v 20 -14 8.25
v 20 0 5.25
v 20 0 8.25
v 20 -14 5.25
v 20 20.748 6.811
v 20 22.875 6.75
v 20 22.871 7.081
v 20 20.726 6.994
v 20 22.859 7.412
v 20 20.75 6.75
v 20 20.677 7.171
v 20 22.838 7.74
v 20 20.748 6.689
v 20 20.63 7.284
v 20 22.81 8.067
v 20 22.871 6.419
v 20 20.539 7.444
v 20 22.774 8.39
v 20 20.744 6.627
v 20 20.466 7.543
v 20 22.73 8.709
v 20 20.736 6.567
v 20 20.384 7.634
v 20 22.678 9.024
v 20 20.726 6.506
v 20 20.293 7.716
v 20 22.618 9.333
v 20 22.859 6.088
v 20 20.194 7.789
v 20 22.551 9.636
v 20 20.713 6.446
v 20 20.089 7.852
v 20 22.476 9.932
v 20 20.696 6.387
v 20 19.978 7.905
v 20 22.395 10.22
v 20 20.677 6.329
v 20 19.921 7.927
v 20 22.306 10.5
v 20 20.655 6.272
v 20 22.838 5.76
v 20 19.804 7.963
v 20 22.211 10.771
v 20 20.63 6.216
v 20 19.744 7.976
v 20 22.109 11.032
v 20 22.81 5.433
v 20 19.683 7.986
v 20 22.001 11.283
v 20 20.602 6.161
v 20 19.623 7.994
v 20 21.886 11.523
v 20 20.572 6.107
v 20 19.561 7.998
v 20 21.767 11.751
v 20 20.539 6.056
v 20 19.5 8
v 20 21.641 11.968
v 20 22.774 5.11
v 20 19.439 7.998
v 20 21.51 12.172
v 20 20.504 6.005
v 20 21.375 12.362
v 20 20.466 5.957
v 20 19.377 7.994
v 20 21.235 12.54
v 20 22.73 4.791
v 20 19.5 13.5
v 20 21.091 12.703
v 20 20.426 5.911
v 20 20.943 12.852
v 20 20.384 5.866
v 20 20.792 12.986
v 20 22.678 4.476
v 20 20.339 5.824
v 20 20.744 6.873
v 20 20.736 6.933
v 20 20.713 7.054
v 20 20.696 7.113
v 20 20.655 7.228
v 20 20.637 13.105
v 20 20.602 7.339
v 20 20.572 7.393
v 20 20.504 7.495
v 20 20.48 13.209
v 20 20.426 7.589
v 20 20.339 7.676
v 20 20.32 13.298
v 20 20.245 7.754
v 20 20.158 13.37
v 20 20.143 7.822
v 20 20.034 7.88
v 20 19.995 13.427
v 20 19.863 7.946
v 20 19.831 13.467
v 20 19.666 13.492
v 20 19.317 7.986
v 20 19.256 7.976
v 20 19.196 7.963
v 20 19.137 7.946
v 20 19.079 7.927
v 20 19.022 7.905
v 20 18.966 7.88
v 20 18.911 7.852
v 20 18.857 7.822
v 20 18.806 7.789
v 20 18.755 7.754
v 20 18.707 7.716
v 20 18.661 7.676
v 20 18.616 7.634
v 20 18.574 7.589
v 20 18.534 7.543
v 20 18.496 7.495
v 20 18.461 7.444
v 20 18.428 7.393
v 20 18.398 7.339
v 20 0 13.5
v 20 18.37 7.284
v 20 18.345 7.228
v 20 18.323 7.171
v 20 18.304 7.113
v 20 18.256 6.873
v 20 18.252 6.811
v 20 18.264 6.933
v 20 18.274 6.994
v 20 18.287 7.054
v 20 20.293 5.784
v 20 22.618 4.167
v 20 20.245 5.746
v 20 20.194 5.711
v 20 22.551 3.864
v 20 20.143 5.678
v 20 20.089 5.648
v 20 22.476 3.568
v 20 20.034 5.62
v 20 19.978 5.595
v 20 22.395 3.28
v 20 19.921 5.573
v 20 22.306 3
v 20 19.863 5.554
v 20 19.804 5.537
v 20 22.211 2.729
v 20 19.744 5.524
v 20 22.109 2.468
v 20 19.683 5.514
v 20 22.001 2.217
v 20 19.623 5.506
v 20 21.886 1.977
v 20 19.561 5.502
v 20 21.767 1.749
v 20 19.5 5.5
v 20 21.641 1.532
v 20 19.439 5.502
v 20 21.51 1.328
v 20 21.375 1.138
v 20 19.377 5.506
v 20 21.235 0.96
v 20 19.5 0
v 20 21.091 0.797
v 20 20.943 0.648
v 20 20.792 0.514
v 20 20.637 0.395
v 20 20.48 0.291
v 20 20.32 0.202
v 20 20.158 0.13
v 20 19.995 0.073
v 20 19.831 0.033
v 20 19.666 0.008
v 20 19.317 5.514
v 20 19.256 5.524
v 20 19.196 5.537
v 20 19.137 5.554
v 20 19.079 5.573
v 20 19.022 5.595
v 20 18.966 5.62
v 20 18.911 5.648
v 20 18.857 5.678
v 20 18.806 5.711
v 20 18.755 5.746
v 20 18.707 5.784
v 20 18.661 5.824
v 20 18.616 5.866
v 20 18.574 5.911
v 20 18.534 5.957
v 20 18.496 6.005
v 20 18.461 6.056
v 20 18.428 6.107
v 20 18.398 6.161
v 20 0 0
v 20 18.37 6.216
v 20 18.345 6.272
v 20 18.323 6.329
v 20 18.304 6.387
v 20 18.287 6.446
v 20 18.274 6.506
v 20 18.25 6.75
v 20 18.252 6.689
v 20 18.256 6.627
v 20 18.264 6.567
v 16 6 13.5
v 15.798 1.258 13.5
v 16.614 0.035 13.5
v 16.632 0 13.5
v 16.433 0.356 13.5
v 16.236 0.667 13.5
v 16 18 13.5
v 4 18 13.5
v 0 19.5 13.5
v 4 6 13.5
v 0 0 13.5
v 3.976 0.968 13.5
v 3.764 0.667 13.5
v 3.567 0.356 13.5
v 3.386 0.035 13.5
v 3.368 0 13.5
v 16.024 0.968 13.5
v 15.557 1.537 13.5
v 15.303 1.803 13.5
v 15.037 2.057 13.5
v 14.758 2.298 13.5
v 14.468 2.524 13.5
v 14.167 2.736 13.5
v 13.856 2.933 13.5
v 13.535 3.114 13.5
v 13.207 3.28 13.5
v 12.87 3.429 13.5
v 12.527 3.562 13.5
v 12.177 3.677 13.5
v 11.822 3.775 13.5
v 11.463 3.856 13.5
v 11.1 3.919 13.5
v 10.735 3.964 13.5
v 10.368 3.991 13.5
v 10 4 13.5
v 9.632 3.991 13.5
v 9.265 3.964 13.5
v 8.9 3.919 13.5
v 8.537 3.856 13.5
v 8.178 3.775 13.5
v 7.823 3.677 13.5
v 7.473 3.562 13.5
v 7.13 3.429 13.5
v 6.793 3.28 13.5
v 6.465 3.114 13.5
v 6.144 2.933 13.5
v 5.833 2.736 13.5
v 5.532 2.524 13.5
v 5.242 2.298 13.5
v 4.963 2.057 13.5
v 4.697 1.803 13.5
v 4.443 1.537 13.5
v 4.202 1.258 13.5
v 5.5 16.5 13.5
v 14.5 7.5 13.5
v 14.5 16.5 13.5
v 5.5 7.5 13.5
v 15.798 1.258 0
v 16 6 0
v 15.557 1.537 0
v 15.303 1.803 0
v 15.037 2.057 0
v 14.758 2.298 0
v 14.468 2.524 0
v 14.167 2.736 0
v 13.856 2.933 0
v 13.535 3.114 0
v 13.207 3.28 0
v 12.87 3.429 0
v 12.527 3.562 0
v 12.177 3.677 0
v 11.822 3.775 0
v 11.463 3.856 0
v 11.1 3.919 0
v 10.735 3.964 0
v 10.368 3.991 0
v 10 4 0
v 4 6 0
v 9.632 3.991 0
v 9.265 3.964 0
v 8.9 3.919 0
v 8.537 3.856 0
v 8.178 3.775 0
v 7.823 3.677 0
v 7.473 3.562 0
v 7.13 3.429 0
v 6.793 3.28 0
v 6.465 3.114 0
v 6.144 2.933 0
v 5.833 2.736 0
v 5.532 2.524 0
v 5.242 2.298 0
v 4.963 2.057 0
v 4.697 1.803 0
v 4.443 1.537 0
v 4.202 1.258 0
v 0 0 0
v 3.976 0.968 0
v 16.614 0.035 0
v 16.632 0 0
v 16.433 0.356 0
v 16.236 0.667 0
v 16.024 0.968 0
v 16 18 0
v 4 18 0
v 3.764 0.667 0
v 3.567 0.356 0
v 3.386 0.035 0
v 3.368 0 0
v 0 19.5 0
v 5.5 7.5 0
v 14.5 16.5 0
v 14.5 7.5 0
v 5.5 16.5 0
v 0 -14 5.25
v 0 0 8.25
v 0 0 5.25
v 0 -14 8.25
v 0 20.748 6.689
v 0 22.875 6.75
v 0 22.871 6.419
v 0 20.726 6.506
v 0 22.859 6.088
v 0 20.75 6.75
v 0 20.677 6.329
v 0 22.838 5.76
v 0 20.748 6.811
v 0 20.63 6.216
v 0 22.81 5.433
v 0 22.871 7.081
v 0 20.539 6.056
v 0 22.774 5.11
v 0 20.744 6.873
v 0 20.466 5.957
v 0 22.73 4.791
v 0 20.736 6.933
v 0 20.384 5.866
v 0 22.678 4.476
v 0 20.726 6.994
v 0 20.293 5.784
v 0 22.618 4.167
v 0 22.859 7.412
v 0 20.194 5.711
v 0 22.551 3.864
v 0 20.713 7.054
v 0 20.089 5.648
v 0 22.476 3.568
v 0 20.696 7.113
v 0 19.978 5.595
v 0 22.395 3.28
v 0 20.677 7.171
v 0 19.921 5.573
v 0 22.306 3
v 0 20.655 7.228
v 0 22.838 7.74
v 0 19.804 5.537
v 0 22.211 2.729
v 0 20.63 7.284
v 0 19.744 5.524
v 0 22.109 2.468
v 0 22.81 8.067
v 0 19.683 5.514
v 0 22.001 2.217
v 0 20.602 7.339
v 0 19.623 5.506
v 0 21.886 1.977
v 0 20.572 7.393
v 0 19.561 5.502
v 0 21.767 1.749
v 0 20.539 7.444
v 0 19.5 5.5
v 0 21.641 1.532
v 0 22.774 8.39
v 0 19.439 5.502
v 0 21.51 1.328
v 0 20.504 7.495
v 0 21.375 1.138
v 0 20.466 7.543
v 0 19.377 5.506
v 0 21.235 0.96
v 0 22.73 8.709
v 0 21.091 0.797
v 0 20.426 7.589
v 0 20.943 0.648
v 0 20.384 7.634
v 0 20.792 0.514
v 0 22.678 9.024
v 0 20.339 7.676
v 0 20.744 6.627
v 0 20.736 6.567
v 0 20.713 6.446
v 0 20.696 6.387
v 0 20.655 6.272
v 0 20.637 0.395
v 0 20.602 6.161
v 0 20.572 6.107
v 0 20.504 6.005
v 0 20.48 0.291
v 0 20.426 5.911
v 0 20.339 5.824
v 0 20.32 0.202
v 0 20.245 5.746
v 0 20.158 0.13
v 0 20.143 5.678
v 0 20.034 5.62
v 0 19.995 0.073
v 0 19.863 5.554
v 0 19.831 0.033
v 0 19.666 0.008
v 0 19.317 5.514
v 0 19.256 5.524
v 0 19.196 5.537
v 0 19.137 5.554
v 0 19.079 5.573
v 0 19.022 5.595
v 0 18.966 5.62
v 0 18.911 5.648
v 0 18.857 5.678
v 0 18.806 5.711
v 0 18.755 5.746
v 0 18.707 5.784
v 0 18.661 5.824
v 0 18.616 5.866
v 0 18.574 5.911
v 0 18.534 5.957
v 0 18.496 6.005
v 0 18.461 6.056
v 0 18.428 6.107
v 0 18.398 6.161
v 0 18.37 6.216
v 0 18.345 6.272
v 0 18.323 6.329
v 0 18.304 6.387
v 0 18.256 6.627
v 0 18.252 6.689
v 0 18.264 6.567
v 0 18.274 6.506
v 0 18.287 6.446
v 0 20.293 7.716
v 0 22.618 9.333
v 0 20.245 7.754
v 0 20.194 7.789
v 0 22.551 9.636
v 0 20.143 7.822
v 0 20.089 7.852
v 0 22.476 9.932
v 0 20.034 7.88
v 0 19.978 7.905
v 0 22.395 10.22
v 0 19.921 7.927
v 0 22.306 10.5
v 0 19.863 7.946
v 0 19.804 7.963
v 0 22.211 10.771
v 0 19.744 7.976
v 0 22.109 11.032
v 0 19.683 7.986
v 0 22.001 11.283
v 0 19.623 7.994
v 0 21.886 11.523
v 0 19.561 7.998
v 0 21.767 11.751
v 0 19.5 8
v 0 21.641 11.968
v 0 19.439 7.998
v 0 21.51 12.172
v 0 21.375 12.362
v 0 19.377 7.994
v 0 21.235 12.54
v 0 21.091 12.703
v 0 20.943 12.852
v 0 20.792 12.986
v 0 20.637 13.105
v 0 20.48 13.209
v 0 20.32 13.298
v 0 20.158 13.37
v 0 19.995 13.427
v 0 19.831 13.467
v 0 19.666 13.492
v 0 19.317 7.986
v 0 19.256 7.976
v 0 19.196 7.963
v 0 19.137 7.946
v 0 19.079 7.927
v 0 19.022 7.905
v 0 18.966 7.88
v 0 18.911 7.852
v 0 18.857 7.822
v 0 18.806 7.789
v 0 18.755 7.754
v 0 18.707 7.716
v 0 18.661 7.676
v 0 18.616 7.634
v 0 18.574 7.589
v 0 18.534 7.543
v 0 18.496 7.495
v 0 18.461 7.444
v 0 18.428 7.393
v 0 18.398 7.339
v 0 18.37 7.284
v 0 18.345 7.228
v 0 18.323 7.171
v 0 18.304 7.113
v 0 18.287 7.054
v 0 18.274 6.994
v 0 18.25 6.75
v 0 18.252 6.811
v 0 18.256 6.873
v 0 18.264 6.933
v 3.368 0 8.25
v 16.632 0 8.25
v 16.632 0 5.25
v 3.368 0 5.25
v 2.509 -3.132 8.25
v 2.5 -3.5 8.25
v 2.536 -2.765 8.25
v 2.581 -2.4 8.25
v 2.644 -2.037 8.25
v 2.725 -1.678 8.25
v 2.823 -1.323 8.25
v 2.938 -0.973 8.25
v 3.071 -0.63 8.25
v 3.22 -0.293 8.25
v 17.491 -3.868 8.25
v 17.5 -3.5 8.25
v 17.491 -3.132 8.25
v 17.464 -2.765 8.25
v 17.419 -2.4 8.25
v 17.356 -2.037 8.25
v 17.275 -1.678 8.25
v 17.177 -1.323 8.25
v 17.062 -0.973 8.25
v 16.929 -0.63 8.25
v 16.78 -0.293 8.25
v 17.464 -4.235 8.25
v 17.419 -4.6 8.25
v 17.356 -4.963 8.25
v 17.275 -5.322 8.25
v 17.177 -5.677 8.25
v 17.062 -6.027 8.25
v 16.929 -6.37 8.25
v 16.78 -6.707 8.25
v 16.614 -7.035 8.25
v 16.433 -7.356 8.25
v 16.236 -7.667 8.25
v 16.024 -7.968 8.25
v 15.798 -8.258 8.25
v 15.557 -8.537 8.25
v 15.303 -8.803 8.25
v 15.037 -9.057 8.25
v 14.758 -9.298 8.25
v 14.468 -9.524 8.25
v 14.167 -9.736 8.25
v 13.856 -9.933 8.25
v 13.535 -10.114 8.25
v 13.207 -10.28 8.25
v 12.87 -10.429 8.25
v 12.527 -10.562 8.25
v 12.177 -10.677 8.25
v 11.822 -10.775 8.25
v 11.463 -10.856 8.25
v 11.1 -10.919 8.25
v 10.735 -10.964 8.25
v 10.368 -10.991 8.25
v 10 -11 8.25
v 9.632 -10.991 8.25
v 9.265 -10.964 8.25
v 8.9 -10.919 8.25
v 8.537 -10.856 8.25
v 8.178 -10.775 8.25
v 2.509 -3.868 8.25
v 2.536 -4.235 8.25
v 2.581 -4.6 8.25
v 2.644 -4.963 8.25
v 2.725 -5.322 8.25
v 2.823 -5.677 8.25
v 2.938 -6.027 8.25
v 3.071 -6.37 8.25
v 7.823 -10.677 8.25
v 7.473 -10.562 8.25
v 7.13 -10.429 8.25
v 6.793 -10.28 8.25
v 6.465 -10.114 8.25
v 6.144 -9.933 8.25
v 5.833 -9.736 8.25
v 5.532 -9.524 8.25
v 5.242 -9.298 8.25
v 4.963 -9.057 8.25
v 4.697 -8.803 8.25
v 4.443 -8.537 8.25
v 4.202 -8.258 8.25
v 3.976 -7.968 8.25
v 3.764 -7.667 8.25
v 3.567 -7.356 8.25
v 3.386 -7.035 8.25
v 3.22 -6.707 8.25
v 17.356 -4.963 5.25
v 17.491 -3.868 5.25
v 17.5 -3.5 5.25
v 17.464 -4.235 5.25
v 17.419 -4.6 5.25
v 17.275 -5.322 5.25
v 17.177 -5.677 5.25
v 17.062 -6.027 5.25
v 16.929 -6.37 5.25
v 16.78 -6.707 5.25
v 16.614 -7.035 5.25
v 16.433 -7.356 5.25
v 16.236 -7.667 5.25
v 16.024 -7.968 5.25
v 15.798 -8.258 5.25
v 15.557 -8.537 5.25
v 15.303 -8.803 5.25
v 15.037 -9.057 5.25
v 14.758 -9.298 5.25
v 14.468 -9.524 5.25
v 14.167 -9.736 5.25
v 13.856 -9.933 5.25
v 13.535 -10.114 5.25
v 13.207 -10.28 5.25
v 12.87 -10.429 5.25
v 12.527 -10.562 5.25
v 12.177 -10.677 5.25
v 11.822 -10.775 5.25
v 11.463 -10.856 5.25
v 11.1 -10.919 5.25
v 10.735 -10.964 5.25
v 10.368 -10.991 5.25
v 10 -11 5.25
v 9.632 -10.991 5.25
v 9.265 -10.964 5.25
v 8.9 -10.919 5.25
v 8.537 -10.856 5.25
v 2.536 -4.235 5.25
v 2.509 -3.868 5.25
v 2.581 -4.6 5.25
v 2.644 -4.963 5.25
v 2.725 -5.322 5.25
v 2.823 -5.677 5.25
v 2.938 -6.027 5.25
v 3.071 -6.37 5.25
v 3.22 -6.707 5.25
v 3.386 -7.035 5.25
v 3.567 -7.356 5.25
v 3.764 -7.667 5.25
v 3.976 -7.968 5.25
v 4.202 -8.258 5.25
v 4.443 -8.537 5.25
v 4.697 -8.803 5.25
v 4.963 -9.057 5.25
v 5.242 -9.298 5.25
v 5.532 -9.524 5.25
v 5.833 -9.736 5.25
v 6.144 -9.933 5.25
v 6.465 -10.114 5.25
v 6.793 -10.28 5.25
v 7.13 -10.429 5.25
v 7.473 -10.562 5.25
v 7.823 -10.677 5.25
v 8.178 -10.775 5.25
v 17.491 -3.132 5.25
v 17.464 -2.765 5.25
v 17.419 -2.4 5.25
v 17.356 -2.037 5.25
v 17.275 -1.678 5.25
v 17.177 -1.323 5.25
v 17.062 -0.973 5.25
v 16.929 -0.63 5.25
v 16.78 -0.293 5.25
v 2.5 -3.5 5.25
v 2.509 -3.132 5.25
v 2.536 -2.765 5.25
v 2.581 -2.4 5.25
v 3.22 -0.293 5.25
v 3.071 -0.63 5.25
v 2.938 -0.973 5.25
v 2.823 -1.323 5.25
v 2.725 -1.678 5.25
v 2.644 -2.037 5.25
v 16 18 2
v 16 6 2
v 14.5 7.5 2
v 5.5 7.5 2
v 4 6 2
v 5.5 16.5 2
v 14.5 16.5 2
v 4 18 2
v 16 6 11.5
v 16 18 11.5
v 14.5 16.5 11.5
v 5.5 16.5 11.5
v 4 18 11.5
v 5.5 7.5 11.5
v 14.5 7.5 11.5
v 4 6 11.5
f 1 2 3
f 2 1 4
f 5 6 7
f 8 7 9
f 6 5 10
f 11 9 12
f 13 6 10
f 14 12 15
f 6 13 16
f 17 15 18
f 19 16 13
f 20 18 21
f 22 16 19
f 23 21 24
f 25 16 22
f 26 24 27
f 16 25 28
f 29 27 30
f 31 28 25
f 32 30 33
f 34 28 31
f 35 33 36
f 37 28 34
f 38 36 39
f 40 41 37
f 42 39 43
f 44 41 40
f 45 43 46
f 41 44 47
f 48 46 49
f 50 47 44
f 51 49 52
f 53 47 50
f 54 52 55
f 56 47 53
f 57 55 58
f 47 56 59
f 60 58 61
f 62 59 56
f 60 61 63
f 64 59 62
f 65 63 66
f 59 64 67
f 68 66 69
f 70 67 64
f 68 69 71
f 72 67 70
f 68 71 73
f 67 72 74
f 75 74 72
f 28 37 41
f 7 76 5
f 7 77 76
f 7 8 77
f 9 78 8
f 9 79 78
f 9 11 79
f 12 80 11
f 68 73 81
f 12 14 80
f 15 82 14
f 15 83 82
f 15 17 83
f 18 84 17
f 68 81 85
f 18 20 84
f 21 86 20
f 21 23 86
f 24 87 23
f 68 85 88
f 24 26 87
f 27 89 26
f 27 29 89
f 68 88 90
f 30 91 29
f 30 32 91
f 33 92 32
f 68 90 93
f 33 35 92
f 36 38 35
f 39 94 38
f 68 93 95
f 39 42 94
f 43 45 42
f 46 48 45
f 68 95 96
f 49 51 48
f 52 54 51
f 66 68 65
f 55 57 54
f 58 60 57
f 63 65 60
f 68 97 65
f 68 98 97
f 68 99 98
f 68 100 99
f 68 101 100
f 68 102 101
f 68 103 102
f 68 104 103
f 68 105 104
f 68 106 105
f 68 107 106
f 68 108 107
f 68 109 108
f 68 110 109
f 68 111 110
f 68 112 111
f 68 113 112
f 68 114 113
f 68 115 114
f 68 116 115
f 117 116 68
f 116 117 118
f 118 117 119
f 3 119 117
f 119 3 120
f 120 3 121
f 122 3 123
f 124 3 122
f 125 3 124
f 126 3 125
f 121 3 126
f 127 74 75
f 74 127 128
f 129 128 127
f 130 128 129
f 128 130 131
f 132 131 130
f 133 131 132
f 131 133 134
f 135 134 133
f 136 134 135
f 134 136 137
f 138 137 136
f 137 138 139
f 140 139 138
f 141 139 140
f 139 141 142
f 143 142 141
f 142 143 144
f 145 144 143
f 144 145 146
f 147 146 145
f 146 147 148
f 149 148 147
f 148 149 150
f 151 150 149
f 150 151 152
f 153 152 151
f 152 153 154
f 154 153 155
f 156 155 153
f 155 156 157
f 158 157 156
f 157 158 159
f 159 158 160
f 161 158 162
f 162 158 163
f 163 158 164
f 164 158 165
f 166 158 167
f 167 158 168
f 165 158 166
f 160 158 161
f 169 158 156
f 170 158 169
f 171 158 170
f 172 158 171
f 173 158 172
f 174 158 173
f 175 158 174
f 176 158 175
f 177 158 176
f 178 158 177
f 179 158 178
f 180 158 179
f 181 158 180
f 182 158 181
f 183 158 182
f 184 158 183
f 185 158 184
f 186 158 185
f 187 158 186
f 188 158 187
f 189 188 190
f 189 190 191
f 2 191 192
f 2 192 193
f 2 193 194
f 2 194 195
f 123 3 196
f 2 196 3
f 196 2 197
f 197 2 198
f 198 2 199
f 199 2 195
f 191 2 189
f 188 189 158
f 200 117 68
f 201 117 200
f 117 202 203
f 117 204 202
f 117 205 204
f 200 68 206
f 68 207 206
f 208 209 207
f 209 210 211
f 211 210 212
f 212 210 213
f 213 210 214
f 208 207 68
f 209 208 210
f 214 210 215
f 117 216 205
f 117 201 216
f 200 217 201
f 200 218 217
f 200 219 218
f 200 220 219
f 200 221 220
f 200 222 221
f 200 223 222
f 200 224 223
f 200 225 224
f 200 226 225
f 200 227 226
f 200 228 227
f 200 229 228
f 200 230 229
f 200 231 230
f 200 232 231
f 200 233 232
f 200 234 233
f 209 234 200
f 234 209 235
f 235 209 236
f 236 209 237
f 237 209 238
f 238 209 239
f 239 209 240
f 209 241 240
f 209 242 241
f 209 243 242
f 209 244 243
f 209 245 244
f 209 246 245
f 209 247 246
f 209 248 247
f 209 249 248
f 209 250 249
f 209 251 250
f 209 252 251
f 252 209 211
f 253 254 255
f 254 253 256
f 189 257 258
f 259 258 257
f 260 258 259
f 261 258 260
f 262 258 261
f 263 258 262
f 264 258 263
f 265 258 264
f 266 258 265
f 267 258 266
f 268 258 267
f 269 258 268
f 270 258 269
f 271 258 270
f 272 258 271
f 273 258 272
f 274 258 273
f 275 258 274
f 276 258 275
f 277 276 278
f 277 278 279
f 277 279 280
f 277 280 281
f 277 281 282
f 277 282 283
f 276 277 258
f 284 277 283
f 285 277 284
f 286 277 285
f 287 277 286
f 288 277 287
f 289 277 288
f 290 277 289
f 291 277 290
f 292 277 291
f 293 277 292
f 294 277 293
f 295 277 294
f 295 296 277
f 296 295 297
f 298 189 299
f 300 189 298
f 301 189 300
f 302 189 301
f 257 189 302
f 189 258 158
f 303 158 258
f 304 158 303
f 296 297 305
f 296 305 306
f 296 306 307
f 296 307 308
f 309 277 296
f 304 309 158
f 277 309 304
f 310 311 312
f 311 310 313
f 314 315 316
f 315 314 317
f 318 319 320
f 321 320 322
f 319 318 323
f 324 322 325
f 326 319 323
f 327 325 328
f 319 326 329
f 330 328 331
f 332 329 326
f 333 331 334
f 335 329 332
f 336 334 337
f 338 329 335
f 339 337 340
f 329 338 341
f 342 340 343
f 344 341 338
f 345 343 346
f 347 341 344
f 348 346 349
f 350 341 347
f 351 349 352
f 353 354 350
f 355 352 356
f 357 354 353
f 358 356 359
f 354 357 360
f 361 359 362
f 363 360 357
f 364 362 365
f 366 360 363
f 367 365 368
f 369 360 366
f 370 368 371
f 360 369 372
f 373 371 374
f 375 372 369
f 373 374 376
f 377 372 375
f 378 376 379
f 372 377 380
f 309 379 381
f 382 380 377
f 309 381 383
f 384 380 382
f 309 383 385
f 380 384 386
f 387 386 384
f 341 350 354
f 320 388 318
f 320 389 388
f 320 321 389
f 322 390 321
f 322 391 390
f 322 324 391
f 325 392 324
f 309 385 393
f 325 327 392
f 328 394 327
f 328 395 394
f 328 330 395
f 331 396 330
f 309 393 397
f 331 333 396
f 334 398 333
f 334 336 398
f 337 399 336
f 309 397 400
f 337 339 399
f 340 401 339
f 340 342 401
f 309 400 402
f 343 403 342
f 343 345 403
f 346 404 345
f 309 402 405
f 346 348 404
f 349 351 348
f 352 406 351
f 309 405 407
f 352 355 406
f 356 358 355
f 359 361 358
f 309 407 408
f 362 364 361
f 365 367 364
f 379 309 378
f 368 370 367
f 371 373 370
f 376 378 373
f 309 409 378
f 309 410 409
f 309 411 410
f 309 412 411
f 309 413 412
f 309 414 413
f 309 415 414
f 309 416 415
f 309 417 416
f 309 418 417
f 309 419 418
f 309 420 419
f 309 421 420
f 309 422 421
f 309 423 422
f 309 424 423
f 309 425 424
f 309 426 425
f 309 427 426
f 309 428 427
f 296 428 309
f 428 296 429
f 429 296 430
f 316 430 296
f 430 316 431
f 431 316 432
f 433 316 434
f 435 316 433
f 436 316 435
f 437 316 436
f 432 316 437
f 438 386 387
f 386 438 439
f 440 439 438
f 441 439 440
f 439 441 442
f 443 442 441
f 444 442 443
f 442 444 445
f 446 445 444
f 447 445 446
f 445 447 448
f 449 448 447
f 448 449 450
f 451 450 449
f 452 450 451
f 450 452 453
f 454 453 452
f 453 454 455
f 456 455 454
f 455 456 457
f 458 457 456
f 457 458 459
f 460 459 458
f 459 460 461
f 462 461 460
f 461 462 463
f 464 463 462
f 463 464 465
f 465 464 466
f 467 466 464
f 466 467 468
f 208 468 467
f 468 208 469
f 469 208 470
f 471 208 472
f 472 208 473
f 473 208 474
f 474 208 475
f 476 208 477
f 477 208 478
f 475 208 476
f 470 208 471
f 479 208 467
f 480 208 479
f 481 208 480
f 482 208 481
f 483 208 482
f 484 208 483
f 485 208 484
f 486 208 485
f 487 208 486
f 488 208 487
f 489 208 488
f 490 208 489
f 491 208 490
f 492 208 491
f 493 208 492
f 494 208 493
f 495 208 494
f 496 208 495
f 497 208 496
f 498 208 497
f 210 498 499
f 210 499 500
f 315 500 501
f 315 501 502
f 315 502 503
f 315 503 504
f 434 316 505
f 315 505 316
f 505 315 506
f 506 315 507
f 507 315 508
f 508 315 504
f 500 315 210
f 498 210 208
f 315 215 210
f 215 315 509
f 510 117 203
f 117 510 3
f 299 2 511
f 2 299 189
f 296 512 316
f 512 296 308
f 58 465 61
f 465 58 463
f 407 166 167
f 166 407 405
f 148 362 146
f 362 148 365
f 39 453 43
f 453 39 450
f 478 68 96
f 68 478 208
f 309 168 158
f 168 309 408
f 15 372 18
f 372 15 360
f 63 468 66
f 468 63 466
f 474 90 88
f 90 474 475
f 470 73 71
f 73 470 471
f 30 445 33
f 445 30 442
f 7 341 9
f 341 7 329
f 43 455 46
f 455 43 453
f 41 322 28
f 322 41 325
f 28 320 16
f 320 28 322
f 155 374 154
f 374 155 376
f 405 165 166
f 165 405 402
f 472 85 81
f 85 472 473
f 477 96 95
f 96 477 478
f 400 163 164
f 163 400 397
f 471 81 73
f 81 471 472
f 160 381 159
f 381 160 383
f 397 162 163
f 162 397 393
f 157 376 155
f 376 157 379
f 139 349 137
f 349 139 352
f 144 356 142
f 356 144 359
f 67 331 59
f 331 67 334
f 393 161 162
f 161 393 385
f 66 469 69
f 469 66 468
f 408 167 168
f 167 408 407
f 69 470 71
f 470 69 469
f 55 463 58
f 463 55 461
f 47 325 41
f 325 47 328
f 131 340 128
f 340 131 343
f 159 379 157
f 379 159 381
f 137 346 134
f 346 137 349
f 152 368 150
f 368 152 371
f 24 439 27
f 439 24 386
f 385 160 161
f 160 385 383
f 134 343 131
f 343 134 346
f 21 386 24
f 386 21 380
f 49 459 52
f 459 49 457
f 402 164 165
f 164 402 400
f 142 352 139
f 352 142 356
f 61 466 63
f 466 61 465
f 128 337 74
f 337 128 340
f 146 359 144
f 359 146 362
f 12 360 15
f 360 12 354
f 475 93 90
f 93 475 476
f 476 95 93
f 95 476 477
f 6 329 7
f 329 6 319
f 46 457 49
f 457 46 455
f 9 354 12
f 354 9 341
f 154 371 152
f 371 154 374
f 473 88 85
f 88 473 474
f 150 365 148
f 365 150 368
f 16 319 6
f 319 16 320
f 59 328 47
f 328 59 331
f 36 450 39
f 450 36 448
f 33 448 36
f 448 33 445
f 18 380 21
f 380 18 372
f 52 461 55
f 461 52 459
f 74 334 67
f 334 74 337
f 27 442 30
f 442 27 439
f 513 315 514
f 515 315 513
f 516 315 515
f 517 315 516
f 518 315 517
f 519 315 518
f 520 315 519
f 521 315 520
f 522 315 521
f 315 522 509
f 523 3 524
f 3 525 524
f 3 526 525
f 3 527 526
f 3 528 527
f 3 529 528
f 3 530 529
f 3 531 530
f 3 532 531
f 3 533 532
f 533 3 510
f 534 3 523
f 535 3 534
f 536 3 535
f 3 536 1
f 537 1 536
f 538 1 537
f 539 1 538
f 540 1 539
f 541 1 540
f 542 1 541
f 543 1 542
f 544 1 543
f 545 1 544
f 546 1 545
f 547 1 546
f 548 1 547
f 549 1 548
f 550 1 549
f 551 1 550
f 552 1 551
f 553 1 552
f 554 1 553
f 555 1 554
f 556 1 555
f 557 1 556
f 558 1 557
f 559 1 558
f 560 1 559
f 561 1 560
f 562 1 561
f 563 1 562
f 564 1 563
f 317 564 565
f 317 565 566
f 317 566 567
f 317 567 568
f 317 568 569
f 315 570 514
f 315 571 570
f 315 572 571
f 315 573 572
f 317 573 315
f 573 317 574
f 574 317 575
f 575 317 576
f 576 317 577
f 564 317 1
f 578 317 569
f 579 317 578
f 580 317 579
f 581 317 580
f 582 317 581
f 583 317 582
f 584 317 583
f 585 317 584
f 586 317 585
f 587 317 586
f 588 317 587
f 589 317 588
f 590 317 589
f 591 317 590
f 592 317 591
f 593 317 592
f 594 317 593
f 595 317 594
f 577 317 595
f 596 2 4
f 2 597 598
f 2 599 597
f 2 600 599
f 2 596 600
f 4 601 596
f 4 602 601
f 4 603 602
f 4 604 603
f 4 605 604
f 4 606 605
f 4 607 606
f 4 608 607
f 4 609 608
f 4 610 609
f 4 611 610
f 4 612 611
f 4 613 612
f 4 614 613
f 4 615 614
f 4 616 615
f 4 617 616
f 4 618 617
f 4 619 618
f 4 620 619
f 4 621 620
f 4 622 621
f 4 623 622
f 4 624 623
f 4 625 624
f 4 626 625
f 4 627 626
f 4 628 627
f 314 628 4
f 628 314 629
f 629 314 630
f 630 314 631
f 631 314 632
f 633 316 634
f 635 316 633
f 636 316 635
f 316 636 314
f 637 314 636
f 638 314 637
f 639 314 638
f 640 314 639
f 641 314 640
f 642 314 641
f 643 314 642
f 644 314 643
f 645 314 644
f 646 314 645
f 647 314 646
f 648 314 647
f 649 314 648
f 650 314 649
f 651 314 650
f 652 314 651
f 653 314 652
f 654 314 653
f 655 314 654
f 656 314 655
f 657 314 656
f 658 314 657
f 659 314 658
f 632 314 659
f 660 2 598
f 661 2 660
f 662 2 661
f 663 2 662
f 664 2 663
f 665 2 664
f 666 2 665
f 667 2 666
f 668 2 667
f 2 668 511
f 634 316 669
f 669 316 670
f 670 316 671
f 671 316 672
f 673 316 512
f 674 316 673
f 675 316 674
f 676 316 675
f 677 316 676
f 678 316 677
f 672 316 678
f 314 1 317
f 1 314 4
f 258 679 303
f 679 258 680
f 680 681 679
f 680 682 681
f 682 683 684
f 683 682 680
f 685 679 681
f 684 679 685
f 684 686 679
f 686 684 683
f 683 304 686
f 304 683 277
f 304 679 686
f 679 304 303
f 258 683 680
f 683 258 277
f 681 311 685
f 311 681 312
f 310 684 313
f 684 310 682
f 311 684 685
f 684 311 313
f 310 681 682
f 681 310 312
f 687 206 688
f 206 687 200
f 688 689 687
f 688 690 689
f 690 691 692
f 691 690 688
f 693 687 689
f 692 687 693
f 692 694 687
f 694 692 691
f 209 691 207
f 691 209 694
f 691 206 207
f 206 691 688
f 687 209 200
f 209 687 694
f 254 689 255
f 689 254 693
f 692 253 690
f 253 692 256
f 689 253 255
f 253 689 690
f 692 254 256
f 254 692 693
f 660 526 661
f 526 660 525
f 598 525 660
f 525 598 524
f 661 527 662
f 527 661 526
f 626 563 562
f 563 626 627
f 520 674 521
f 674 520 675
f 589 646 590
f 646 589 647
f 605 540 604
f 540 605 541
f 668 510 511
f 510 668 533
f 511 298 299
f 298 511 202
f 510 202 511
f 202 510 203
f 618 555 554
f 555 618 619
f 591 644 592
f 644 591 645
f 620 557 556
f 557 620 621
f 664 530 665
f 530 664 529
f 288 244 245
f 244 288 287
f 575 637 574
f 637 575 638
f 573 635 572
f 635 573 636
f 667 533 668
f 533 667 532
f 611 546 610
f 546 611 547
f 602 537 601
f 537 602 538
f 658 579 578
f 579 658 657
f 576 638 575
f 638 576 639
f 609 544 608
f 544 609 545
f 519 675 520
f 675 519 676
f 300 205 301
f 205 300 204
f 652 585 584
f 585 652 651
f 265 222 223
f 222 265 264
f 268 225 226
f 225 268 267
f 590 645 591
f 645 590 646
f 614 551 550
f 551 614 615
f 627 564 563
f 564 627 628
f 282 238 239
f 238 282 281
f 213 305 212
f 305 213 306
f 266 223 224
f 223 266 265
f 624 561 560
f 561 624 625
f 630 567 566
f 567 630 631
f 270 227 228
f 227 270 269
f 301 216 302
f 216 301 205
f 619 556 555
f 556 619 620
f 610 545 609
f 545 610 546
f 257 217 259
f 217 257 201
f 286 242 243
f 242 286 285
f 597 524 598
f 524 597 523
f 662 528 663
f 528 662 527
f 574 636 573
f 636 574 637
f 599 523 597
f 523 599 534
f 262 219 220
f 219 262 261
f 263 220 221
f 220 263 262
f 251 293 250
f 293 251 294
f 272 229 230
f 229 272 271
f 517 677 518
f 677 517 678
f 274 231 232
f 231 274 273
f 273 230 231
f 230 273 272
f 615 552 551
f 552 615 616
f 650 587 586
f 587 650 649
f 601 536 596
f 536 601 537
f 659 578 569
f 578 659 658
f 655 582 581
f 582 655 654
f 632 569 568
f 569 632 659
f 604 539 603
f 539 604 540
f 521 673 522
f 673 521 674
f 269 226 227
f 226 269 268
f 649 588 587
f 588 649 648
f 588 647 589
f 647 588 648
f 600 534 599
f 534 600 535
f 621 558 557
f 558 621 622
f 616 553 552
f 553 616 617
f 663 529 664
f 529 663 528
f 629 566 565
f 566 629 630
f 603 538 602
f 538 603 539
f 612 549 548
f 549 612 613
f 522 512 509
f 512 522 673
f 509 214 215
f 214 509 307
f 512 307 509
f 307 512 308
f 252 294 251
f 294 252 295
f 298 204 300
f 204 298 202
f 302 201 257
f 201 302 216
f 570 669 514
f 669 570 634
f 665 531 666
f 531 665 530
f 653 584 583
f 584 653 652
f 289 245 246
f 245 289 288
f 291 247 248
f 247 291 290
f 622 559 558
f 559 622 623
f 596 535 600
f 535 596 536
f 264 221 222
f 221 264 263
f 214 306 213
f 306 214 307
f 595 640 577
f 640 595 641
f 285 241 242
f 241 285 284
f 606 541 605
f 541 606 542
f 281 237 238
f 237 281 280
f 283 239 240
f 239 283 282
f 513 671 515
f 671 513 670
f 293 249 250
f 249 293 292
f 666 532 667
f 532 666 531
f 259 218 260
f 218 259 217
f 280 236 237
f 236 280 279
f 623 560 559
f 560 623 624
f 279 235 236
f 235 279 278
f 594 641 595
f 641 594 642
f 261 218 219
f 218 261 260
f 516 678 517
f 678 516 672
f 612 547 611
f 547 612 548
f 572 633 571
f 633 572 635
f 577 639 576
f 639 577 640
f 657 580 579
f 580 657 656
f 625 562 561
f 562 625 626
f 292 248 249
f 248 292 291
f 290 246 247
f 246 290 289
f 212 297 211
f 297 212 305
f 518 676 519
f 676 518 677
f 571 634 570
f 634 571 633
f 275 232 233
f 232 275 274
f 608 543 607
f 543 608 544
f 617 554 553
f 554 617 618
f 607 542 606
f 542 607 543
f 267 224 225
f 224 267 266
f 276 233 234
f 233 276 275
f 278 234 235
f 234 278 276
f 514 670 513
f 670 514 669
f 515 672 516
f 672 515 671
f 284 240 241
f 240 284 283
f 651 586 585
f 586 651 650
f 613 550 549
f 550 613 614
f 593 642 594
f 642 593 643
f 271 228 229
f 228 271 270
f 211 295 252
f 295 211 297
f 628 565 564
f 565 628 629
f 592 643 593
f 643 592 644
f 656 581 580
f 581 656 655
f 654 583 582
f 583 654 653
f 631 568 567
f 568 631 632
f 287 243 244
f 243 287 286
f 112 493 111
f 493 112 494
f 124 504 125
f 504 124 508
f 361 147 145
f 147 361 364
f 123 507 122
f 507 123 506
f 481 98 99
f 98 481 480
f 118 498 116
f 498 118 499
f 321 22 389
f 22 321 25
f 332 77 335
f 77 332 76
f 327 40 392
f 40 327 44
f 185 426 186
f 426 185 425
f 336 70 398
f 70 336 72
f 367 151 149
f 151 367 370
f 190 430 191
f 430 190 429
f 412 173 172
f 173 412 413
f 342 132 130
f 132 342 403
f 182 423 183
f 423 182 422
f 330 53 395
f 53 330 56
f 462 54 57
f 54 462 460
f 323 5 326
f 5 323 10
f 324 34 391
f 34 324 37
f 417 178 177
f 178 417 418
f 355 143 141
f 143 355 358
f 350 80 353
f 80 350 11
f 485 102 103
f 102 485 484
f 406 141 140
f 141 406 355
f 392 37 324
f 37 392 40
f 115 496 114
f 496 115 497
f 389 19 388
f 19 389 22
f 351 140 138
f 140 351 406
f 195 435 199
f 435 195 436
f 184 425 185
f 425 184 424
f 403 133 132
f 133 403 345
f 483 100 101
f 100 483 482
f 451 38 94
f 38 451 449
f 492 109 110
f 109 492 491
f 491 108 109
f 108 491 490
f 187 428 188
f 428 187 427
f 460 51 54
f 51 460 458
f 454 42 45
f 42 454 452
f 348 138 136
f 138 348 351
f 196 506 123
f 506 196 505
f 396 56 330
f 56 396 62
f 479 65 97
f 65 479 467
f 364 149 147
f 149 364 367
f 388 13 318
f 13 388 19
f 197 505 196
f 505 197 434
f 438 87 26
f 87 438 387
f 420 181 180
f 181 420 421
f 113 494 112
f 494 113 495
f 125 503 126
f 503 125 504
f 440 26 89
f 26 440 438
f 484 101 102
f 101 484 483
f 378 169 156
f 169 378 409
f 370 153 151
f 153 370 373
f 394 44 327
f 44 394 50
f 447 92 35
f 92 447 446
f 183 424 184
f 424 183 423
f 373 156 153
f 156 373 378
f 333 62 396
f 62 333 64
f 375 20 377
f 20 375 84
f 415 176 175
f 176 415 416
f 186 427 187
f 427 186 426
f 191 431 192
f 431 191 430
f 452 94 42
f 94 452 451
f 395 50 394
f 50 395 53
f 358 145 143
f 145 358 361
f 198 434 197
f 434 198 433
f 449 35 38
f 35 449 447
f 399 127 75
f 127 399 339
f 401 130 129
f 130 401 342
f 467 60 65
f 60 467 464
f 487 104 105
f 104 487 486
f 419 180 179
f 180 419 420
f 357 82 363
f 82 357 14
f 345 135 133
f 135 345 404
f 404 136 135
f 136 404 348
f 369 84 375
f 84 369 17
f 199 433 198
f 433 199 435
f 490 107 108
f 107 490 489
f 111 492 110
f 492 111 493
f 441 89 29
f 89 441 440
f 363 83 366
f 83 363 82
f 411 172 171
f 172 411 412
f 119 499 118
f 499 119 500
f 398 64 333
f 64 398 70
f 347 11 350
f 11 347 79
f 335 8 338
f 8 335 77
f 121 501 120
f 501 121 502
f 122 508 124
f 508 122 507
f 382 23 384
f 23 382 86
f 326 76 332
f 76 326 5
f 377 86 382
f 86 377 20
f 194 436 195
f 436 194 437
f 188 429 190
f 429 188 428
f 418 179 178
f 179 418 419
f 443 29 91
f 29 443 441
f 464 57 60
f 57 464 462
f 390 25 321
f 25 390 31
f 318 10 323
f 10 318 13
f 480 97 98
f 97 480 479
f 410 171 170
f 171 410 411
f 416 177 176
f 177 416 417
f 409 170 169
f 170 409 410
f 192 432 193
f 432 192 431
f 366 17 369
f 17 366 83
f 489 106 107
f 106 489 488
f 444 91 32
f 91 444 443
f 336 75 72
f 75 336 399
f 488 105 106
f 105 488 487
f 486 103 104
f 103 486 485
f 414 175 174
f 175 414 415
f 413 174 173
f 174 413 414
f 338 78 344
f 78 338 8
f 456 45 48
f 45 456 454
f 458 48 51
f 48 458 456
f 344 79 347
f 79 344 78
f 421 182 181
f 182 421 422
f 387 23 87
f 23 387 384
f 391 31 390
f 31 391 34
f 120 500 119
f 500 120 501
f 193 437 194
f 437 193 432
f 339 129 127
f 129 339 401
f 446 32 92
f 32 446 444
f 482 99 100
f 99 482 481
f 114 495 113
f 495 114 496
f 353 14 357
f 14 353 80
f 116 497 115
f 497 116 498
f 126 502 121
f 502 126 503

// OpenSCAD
// file: locking_pin.scad
// Copyright 2024 Martin Scheidt (Attribution 4.0 International, CC-BY 4.0)
//
// You are free to copy and redistribute the material in any medium or format.
// You are free to remix, transform, and build upon the material for any purpose, even commercially.
// You must give appropriate credit, provide a link to the license, and indicate if changes were made.
// You may not apply legal terms or technological measures that legally restrict others from doing anything the license permits.
// No warranties are given.

include<config.scad>

locking_pin();

module grip_ring(){
    height = 1.2;
    depth = 1.2;
    difference(){
        cylinder(h=height, d=locker_width);
        cylinder(h=height, d=locker_width-depth);
    }
}
module locking_pin(){
    difference(){
    minkowski() {
        difference(){
            cylinder(d = locker_width-2*rounding, h = locker_height-2*rounding);
            rotate([0,0,90]) translate([(-locker_width/2),(-(lever_thickness_switch+move_tolerance)/2-rounding),(locker_height-lever_height)])cube([(locker_width),(lever_thickness_switch+2*rounding+move_tolerance),(lever_height+2*rounding)]);
        };
        sphere(rounding);
    }
    translate([0,0,1]) grip_ring();
    }
}

echo("lever_height+2*rounding: ",lever_height+2*rounding);
echo("z_pos_axis-handle_height/2+move_tolerance+2*rounding: ", z_pos_axis-handle_height/2+move_tolerance+2*rounding);

//signal_locker();
// file: basis_component-roundedBox.scad
// Copyright 2024 Martin Scheidt (Attribution 4.0 International, CC-BY 4.0)
//
// You are free to copy and redistribute the material in any medium or format.
// You are free to remix, transform, and build upon the material for any purpose, even commercially.
// You must give appropriate credit, provide a link to the license, and indicate if changes were made.
// You may not apply legal terms or technological measures that legally restrict others from doing anything the license permits.
// No warranties are given.

include<config.scad>

curvedBox();

module magnet_hole(){
    cylinder(h=magnet_thickness+move_tolerance, d=magnet_diameter+move_tolerance);
}

module curvedBox(){
    module box(){
        difference(){
            cube([body_width, body_depth, body_height]);
        }
    }
    module round_edge(){
        cylinder(h=body_height, r=track_arc_inner_radius);
    }
    difference(){
        intersection(){
            intersection(){
                translate([0,0,0])box();
                translate([track_arc_inner_radius-sagitta,body_depth/2,0])round_edge();
            }
            intersection(){
                translate([0,0,0])box();
                translate([body_width-track_arc_inner_radius+sagitta,body_depth/2,0])round_edge();
            }
        }
        //magnet holes
        translate([0,body_depth/2 - magnet_distance_to_middle, magnet_z])rotate([0,90,0])magnet_hole();
        translate([0,body_depth/2 + magnet_distance_to_middle, magnet_z])rotate([0,90,0])magnet_hole();
        translate([body_width-magnet_thickness-0.5,body_depth/2 - magnet_distance_to_middle, magnet_z])rotate([0,90,0])magnet_hole();
        translate([body_width-magnet_thickness-0.5,body_depth/2 + magnet_distance_to_middle, magnet_z])rotate([0,90,0])magnet_hole();
        
    }
}
// main file
// Copyright 2020,2024 Martin Scheidt (Attribution 4.0 International, CC-BY 4.0)
//
// You are free to copy and redistribute the material in any medium or format.
// You are free to remix, transform, and build upon the material for any purpose, even commercially.
// You must give appropriate credit, provide a link to the license, and indicate if changes were made.
// You may not apply legal terms or technological measures that legally restrict others from doing anything the license permits.
// No warranties are given.


include<config.scad>
use<./basis_component-roundedBox.scad>
use<./locking_pin.scad> // used in visualize_colorBlock_in_body("main", "y");


module equ_triangle(side_length,corner_radius,signal_triangle_height){
    // copy from https://www.youtube.com/watch?v=5hDB8Nsd688
    translate([0,corner_radius]){
    hull(){
        cylinder(r=corner_radius,h=signal_triangle_height);
     rotate([0,0,60])translate([side_length-corner_radius*2,0,0])cylinder(r=corner_radius,h=signal_triangle_height);   
         rotate([0,0,120])translate([side_length-corner_radius*2,0,0])cylinder(r=corner_radius,h=signal_triangle_height);
        };
};
};

module attach_arrow(){
    hull() {
        cyl_d = 0.4;
        translate([cyl_d/2,(attach_arrow_depth-cyl_d)/2,0]) cylinder(d=cyl_d, h=attach_arrow_height);
        translate([cyl_d/2,-(attach_arrow_depth-cyl_d)/2,0]) cylinder(d=cyl_d, h=attach_arrow_height);
        translate([attach_arrow_depth-cyl_d/2,0,0]) cylinder(d=cyl_d, h=attach_arrow_height);

    }
}

module driving_direction_arrow(){
    translate([attach_arrow_depth/2,0,0]) rotate([0,0,-90])attach_arrow();
    translate([(attach_arrow_depth-1.2)/2,0,0]) cube([1.2,attach_arrow_depth, attach_arrow_height]);
}


//symbol_main();
module symbol_main(){
    difference(){
        cube([signal_symbol_size, signal_symbol_size, engraving_height]);
        translate([engraving_thickness,engraving_thickness,0]) cube([signal_symbol_size-2*engraving_thickness, signal_symbol_size-2*engraving_thickness, engraving_height]);
    }
}
//symbol_distant();
module symbol_distant(){
    // symbol_distant = sb
    cylinder_diameter = 0.4;
    sb_beta = atan(1/2);
    sb_gamma = 180-90-sb_beta;
    sb_theta = 90-sb_gamma;
    top_cyl_ydif = engraving_thickness/sin(sb_beta);
    bottom_cyl_xdif = engraving_thickness/sin(sb_gamma) + tan(sb_theta)*engraving_thickness;

    difference(){
        hull(){
            translate([signal_symbol_size/2,cylinder_diameter/2,0])cylinder(d=cylinder_diameter, h=engraving_height);
            translate([cylinder_diameter/2, signal_symbol_size-cylinder_diameter/2,0]) cylinder(d=cylinder_diameter, h=engraving_height);
            translate([signal_symbol_size-cylinder_diameter/2, signal_symbol_size-cylinder_diameter/2,0])cylinder(d=cylinder_diameter, h=engraving_height);
        }
        hull(){
            translate([signal_symbol_size/2,top_cyl_ydif+cylinder_diameter/2,0])cylinder(d=cylinder_diameter, h=engraving_height);
            translate([bottom_cyl_xdif+cylinder_diameter/2, signal_symbol_size-engraving_thickness-cylinder_diameter/2,0]) cylinder(d=cylinder_diameter, h=engraving_height);
            translate([signal_symbol_size-bottom_cyl_xdif-cylinder_diameter/2, signal_symbol_size-engraving_thickness-cylinder_diameter/2,0])cylinder(d=cylinder_diameter, h=engraving_height);
        }
    } 
}

module cavity_cube(){
    translate([wall_thickness_x,wall_thickness_y,wall_thickness_z]) cube([body_width-2*wall_thickness_x, body_depth-2*wall_thickness_y, body_height-wall_thickness_z]);
}
module handle_space_cubes(){
    translate([wall_thickness_x,0,z_pos_axis-(handle_height)/2-move_tolerance]) cube([body_width-2*wall_thickness_x,wall_thickness_y,body_height]); //z=wall_thickness_z+(block_height-handle_height)/2
    translate([wall_thickness_x,body_depth-wall_thickness_y,z_pos_axis-(handle_height)/2-move_tolerance]) cube([body_width-2*wall_thickness_x,wall_thickness_y,body_height]);
}

module space_locking_pin(){
    translate([0, body_depth/2 - magnet_distance_to_middle - magnet_diameter - 2*move_tolerance - lock_lever_depth, body_height - lock_lever_height])cube([wall_thickness_x-lock_lever_thickness, lock_lever_depth+move_tolerance, lock_lever_height]);
}
//body("main");

module body(symbol_type){
    difference(){
        curvedBox(); // import from basis_component-roundedBox
        cavity_cube();
        //axis
        translate([0,body_depth/2,z_pos_axis]) rotate([0,90,0]) cylinder(h=body_width, d=axis_diameter);
        // handle space
        handle_space_cubes();
        // locker pin hole
        if(symbol_type=="main"){
            difference(){
                translate([body_width/2,body_depth-wall_thickness_y/2,0]) cylinder(h=locker_height, d=locker_width+2*move_tolerance);
                translate([wall_thickness_x+move_tolerance,body_depth-wall_thickness_y,0])cube([block_width,locker_width,locker_height]);
            }
        }
    }
    //translate([body_width-wall_thickness_x+attach_arrow_wall_distance,body_depth/2,body_height]) attach_arrow();
    translate([body_width-wall_thickness_x+attach_arrow_wall_distance,body_depth/2,body_height]) driving_direction_arrow();
    translate([attach_arrow_wall_distance,body_depth/2,body_height]) driving_direction_arrow();
    if(symbol_type=="main"){
        lock_block_width = 6;
        lock_block_depth = 2;
        lock_block_height = z_pos_axis-handle_height/2-move_tolerance+handle_height;
        translate([(body_width-lock_block_width)/2, wall_thickness_y,0])cube([lock_block_width,lock_block_depth,lock_block_height]);
    }
}

//color_block(("distant"));
module color_block(symbol_type){
    difference(){
        union(){
            cube([block_width, block_depth, block_height]);
            translate([0,block_depth,block_height/2]) scale([1,0.5,1]) rotate([0,90,0]) cylinder(h=block_width, r=block_height/2); // scale y: (overhang)/(block_height/2) // curve is flat, because the printer can't make that much overhang
            //handle
            translate([0,-handle_depth, (block_height-handle_height)/2]) cube([block_width, handle_depth, handle_height]);
        }
        //axis
        translate([0,block_depth,block_height/2]) rotate([0,90,0]) cylinder(h=block_width, d=axis_diameter+move_tolerance);
        // color border line
        //translate([0,0,(block_height-handle_height)/2-fine_line])cube([fine_line, 2*block_depth, fine_line]);
        //translate([0,0,(block_height+handle_height)/2])cube([fine_line, 2*block_depth, fine_line]);
        //symbol
        if(symbol_type == "main"){
            translate([signal_symbol_side_space, 4*(block_depth-signal_symbol_size)/5,0]) symbol_main();
            translate([signal_symbol_side_space,4*(block_depth-signal_symbol_size)/5,block_height-engraving_height]) symbol_main();
            // locker pin hole
            translate([block_width/2,-wall_thickness_y/2-3*move_tolerance,0]) cylinder(h=locker_height, d=locker_width+2*move_tolerance);
        }
        if (symbol_type == "distant"){
            translate([signal_symbol_size+signal_symbol_side_space,signal_symbol_size+4*(block_depth-signal_symbol_size)/5,0]) rotate([0,0,180]) symbol_distant();
            translate([signal_symbol_side_space,4*(block_depth-signal_symbol_size)/5,block_height-engraving_height]) symbol_distant();
        }
        
    }
}


module visualize_colorBlock_in_body(symbol_type, state){
    translate([0,-body_depth/2,-z_pos_axis]) body(symbol_type); //z=-block_height/2-wall_thickness_z
    if(state== "-y"){
        rotate([0,0,0]) translate([wall_thickness_x + move_tolerance, -body_depth/2 + wall_thickness_y+3*move_tolerance,-block_height/2-wall_thickness_z+wall_thickness_z]) color_block(symbol_type=symbol_type);
    }
    if(state== "y"){
        rotate([-180,0,0]) translate([wall_thickness_x + move_tolerance, -body_depth/2 + wall_thickness_y+3*move_tolerance,-block_height/2-wall_thickness_z+wall_thickness_z]) color_block(symbol_type=symbol_type);
        if(symbol_type=="main"){
            translate([body_width/2,(body_depth-wall_thickness_y)/2,locker_height-0.5-z_pos_axis]) rotate([180,0,90]) locking_pin();
        }
    }
}

module prove_moveability(){
    //move_tolerance space between bottom and color_block
    translate([0,-body_depth/2,-block_height/2]) cube([body_width,body_depth,2*move_tolerance]);
    //middle position
    rotate([-90,0,0]) translate([wall_thickness_x + move_tolerance, -body_depth/2 + wall_thickness_y+move_tolerance*2,-block_height/2-wall_thickness_z+wall_thickness_z]) color_block(symbol_type=symbol_type);
}

module print_components(symbol_type){
    body(symbol_type);
    translate([-30,handle_depth,0]) color_block(symbol_type=symbol_type);
}

module unworked_color_block(){
    height = block_height;
    width = block_width;
    depth = block_depth+handle_depth+height/2;
    cube([width, depth, height]);
    
}


module mill_color_block_side() {
    projection(cut = true) rotate([0,90,0]) difference(){
        unworked_color_block(); 
        translate([0,handle_depth,0]) color_block("distant");
        
    }
//    %unworked_color_block();
//    translate([0,handle_depth,0]) color_block(symbol_type);
}

module mill_color_block_top(symbol_type){
    projection(cut=true)difference(){
        unworked_color_block();
        if(symbol_type == "main"){
            translate([signal_symbol_side_space,(block_depth-signal_symbol_size)/2 + handle_depth,0]) symbol_main();
        }
        if (symbol_type == "distant"){
            translate([block_width/2,(block_depth-signal_triangle_height)/2 + handle_depth,0]) symbol_distant();
        }
    }
    
}
module mill_color_block_bottom_distant() {
    projection(cut=true)difference(){
        unworked_color_block();
        translate([block_width/2,signal_triangle_height+(block_depth-signal_triangle_height)/2 + handle_depth,0]) rotate([0,0,180]) symbol_distant();
    }
}


module mill_signal_body_top_2(symbol_type){
    projection(cut=true) difference(){
            cube([body_width, body_depth, body_height]);
            body(symbol_type);
        }
        projection() handle_space_cubes();
    }
module mill_signal_body_top_1(symbol_type){
    projection(cut=true) difference(){
            cube([body_width, body_depth, body_height]);
            translate([0,0,-wall_thickness_z]) cavity_cube(); //has to be moved to the ground
            if (symbol_type == "main"){
                translate([0,0, -(body_height - lock_lever_height)]) space_locking_pin(); //has to be moved to the ground
                translate([body_width-(wall_thickness_x-lock_lever_thickness+move_tolerance),0,-(body_height - lock_lever_height)])space_locking_pin(); //has to be moved to the ground
                
            }
    }
}

module mill_signal_body_side(){
    // its always "distant" because the locking part shouldn't be visible at the side projection.
     projection(cut=true) translate([body_height,0,-(body_width-2)])rotate([0,-90,0])body("distant");
}
  
module values_to_console(){
    echo("handle space: ", (block_height-handle_height)/2);
    echo("axis height: ", block_height/2+wall_thickness_z);
    echo("wall_thickness_x: ", wall_thickness_x);
    echo("block_depth: ", block_depth);
    echo("y pos lockpin: ", body_depth/2 - magnet_distance_to_middle - magnet_diameter - move_tolerance*2 - lock_lever_depth);
    echo("(block_height-handle_height)/2: ",(block_height-handle_height)/2);
    echo("(block_height+handle_height)/2: ", (block_height+handle_height)/2);
}

module 2D_drawing_signal_body(symbol_type){
    translate([50, 50, 0]) union(){
        projection(cut = true) translate([0,0,-7])body(symbol_type);
        projection(cut = true) translate([50, 0, -body_width+1.5])rotate([0,-90,0]) body(symbol_type);
        projection(cut = true) translate([-20,0,1.5]) rotate([0,90,0]) body(symbol_type);
        projection(cut = true) translate([0,70,0]) rotate([90,0,0])body(symbol_type);
        projection(cut = true) translate([0,-20,0]) rotate([-90,0,0])body(symbol_type);
        projection(cut = true) translate([0,90,-body_depth/2]) rotate([90,0,0])body(symbol_type);
    }
}

module 2D_drawing_color_block(symbol_type){
     translate([50, 50, 0]) union(){
        mill_color_block_top(symbol_type);
        projection(cut=true) translate([30,handle_depth,block_width/2]) rotate([0,90,0]) color_block(symbol_type);
        projection(cut = true) translate([-20,handle_depth,0]) rotate([0,90,0]) color_block(symbol_type);
        projection(cut = true) translate([0, 60, -block_width-axis_diameter/2]) rotate([90,0,0]) color_block(symbol_type);
        if(symbol_type == "distant"){
           translate([50,0,0]) mill_color_block_bottom_distant();
        } 
    }
}
//visualize_colorBlock_in_body("distant", "y");
//print_components("main");

color_block("main");



//body("distant");
//symbol_distant();


/********************************
drawing
********************************/
//2D_drawing_signal_body("main");
//body("main");

//2D_drawing_signal_body("distant");
//body("distant");

//2D_drawing_color_block("main");
//color_block("main");

//2D_drawing_color_block("distant");
//color_block("distant");

/********************************
mill
**********************************/
//mill_color_block_side();
//mill_color_block_top("main");
//mill_color_block_bottom_distant();
//mill_signal_body_top_1("main");
//mill_signal_body_top_2("main");
//mill_signal_body_side();

values_to_console();
